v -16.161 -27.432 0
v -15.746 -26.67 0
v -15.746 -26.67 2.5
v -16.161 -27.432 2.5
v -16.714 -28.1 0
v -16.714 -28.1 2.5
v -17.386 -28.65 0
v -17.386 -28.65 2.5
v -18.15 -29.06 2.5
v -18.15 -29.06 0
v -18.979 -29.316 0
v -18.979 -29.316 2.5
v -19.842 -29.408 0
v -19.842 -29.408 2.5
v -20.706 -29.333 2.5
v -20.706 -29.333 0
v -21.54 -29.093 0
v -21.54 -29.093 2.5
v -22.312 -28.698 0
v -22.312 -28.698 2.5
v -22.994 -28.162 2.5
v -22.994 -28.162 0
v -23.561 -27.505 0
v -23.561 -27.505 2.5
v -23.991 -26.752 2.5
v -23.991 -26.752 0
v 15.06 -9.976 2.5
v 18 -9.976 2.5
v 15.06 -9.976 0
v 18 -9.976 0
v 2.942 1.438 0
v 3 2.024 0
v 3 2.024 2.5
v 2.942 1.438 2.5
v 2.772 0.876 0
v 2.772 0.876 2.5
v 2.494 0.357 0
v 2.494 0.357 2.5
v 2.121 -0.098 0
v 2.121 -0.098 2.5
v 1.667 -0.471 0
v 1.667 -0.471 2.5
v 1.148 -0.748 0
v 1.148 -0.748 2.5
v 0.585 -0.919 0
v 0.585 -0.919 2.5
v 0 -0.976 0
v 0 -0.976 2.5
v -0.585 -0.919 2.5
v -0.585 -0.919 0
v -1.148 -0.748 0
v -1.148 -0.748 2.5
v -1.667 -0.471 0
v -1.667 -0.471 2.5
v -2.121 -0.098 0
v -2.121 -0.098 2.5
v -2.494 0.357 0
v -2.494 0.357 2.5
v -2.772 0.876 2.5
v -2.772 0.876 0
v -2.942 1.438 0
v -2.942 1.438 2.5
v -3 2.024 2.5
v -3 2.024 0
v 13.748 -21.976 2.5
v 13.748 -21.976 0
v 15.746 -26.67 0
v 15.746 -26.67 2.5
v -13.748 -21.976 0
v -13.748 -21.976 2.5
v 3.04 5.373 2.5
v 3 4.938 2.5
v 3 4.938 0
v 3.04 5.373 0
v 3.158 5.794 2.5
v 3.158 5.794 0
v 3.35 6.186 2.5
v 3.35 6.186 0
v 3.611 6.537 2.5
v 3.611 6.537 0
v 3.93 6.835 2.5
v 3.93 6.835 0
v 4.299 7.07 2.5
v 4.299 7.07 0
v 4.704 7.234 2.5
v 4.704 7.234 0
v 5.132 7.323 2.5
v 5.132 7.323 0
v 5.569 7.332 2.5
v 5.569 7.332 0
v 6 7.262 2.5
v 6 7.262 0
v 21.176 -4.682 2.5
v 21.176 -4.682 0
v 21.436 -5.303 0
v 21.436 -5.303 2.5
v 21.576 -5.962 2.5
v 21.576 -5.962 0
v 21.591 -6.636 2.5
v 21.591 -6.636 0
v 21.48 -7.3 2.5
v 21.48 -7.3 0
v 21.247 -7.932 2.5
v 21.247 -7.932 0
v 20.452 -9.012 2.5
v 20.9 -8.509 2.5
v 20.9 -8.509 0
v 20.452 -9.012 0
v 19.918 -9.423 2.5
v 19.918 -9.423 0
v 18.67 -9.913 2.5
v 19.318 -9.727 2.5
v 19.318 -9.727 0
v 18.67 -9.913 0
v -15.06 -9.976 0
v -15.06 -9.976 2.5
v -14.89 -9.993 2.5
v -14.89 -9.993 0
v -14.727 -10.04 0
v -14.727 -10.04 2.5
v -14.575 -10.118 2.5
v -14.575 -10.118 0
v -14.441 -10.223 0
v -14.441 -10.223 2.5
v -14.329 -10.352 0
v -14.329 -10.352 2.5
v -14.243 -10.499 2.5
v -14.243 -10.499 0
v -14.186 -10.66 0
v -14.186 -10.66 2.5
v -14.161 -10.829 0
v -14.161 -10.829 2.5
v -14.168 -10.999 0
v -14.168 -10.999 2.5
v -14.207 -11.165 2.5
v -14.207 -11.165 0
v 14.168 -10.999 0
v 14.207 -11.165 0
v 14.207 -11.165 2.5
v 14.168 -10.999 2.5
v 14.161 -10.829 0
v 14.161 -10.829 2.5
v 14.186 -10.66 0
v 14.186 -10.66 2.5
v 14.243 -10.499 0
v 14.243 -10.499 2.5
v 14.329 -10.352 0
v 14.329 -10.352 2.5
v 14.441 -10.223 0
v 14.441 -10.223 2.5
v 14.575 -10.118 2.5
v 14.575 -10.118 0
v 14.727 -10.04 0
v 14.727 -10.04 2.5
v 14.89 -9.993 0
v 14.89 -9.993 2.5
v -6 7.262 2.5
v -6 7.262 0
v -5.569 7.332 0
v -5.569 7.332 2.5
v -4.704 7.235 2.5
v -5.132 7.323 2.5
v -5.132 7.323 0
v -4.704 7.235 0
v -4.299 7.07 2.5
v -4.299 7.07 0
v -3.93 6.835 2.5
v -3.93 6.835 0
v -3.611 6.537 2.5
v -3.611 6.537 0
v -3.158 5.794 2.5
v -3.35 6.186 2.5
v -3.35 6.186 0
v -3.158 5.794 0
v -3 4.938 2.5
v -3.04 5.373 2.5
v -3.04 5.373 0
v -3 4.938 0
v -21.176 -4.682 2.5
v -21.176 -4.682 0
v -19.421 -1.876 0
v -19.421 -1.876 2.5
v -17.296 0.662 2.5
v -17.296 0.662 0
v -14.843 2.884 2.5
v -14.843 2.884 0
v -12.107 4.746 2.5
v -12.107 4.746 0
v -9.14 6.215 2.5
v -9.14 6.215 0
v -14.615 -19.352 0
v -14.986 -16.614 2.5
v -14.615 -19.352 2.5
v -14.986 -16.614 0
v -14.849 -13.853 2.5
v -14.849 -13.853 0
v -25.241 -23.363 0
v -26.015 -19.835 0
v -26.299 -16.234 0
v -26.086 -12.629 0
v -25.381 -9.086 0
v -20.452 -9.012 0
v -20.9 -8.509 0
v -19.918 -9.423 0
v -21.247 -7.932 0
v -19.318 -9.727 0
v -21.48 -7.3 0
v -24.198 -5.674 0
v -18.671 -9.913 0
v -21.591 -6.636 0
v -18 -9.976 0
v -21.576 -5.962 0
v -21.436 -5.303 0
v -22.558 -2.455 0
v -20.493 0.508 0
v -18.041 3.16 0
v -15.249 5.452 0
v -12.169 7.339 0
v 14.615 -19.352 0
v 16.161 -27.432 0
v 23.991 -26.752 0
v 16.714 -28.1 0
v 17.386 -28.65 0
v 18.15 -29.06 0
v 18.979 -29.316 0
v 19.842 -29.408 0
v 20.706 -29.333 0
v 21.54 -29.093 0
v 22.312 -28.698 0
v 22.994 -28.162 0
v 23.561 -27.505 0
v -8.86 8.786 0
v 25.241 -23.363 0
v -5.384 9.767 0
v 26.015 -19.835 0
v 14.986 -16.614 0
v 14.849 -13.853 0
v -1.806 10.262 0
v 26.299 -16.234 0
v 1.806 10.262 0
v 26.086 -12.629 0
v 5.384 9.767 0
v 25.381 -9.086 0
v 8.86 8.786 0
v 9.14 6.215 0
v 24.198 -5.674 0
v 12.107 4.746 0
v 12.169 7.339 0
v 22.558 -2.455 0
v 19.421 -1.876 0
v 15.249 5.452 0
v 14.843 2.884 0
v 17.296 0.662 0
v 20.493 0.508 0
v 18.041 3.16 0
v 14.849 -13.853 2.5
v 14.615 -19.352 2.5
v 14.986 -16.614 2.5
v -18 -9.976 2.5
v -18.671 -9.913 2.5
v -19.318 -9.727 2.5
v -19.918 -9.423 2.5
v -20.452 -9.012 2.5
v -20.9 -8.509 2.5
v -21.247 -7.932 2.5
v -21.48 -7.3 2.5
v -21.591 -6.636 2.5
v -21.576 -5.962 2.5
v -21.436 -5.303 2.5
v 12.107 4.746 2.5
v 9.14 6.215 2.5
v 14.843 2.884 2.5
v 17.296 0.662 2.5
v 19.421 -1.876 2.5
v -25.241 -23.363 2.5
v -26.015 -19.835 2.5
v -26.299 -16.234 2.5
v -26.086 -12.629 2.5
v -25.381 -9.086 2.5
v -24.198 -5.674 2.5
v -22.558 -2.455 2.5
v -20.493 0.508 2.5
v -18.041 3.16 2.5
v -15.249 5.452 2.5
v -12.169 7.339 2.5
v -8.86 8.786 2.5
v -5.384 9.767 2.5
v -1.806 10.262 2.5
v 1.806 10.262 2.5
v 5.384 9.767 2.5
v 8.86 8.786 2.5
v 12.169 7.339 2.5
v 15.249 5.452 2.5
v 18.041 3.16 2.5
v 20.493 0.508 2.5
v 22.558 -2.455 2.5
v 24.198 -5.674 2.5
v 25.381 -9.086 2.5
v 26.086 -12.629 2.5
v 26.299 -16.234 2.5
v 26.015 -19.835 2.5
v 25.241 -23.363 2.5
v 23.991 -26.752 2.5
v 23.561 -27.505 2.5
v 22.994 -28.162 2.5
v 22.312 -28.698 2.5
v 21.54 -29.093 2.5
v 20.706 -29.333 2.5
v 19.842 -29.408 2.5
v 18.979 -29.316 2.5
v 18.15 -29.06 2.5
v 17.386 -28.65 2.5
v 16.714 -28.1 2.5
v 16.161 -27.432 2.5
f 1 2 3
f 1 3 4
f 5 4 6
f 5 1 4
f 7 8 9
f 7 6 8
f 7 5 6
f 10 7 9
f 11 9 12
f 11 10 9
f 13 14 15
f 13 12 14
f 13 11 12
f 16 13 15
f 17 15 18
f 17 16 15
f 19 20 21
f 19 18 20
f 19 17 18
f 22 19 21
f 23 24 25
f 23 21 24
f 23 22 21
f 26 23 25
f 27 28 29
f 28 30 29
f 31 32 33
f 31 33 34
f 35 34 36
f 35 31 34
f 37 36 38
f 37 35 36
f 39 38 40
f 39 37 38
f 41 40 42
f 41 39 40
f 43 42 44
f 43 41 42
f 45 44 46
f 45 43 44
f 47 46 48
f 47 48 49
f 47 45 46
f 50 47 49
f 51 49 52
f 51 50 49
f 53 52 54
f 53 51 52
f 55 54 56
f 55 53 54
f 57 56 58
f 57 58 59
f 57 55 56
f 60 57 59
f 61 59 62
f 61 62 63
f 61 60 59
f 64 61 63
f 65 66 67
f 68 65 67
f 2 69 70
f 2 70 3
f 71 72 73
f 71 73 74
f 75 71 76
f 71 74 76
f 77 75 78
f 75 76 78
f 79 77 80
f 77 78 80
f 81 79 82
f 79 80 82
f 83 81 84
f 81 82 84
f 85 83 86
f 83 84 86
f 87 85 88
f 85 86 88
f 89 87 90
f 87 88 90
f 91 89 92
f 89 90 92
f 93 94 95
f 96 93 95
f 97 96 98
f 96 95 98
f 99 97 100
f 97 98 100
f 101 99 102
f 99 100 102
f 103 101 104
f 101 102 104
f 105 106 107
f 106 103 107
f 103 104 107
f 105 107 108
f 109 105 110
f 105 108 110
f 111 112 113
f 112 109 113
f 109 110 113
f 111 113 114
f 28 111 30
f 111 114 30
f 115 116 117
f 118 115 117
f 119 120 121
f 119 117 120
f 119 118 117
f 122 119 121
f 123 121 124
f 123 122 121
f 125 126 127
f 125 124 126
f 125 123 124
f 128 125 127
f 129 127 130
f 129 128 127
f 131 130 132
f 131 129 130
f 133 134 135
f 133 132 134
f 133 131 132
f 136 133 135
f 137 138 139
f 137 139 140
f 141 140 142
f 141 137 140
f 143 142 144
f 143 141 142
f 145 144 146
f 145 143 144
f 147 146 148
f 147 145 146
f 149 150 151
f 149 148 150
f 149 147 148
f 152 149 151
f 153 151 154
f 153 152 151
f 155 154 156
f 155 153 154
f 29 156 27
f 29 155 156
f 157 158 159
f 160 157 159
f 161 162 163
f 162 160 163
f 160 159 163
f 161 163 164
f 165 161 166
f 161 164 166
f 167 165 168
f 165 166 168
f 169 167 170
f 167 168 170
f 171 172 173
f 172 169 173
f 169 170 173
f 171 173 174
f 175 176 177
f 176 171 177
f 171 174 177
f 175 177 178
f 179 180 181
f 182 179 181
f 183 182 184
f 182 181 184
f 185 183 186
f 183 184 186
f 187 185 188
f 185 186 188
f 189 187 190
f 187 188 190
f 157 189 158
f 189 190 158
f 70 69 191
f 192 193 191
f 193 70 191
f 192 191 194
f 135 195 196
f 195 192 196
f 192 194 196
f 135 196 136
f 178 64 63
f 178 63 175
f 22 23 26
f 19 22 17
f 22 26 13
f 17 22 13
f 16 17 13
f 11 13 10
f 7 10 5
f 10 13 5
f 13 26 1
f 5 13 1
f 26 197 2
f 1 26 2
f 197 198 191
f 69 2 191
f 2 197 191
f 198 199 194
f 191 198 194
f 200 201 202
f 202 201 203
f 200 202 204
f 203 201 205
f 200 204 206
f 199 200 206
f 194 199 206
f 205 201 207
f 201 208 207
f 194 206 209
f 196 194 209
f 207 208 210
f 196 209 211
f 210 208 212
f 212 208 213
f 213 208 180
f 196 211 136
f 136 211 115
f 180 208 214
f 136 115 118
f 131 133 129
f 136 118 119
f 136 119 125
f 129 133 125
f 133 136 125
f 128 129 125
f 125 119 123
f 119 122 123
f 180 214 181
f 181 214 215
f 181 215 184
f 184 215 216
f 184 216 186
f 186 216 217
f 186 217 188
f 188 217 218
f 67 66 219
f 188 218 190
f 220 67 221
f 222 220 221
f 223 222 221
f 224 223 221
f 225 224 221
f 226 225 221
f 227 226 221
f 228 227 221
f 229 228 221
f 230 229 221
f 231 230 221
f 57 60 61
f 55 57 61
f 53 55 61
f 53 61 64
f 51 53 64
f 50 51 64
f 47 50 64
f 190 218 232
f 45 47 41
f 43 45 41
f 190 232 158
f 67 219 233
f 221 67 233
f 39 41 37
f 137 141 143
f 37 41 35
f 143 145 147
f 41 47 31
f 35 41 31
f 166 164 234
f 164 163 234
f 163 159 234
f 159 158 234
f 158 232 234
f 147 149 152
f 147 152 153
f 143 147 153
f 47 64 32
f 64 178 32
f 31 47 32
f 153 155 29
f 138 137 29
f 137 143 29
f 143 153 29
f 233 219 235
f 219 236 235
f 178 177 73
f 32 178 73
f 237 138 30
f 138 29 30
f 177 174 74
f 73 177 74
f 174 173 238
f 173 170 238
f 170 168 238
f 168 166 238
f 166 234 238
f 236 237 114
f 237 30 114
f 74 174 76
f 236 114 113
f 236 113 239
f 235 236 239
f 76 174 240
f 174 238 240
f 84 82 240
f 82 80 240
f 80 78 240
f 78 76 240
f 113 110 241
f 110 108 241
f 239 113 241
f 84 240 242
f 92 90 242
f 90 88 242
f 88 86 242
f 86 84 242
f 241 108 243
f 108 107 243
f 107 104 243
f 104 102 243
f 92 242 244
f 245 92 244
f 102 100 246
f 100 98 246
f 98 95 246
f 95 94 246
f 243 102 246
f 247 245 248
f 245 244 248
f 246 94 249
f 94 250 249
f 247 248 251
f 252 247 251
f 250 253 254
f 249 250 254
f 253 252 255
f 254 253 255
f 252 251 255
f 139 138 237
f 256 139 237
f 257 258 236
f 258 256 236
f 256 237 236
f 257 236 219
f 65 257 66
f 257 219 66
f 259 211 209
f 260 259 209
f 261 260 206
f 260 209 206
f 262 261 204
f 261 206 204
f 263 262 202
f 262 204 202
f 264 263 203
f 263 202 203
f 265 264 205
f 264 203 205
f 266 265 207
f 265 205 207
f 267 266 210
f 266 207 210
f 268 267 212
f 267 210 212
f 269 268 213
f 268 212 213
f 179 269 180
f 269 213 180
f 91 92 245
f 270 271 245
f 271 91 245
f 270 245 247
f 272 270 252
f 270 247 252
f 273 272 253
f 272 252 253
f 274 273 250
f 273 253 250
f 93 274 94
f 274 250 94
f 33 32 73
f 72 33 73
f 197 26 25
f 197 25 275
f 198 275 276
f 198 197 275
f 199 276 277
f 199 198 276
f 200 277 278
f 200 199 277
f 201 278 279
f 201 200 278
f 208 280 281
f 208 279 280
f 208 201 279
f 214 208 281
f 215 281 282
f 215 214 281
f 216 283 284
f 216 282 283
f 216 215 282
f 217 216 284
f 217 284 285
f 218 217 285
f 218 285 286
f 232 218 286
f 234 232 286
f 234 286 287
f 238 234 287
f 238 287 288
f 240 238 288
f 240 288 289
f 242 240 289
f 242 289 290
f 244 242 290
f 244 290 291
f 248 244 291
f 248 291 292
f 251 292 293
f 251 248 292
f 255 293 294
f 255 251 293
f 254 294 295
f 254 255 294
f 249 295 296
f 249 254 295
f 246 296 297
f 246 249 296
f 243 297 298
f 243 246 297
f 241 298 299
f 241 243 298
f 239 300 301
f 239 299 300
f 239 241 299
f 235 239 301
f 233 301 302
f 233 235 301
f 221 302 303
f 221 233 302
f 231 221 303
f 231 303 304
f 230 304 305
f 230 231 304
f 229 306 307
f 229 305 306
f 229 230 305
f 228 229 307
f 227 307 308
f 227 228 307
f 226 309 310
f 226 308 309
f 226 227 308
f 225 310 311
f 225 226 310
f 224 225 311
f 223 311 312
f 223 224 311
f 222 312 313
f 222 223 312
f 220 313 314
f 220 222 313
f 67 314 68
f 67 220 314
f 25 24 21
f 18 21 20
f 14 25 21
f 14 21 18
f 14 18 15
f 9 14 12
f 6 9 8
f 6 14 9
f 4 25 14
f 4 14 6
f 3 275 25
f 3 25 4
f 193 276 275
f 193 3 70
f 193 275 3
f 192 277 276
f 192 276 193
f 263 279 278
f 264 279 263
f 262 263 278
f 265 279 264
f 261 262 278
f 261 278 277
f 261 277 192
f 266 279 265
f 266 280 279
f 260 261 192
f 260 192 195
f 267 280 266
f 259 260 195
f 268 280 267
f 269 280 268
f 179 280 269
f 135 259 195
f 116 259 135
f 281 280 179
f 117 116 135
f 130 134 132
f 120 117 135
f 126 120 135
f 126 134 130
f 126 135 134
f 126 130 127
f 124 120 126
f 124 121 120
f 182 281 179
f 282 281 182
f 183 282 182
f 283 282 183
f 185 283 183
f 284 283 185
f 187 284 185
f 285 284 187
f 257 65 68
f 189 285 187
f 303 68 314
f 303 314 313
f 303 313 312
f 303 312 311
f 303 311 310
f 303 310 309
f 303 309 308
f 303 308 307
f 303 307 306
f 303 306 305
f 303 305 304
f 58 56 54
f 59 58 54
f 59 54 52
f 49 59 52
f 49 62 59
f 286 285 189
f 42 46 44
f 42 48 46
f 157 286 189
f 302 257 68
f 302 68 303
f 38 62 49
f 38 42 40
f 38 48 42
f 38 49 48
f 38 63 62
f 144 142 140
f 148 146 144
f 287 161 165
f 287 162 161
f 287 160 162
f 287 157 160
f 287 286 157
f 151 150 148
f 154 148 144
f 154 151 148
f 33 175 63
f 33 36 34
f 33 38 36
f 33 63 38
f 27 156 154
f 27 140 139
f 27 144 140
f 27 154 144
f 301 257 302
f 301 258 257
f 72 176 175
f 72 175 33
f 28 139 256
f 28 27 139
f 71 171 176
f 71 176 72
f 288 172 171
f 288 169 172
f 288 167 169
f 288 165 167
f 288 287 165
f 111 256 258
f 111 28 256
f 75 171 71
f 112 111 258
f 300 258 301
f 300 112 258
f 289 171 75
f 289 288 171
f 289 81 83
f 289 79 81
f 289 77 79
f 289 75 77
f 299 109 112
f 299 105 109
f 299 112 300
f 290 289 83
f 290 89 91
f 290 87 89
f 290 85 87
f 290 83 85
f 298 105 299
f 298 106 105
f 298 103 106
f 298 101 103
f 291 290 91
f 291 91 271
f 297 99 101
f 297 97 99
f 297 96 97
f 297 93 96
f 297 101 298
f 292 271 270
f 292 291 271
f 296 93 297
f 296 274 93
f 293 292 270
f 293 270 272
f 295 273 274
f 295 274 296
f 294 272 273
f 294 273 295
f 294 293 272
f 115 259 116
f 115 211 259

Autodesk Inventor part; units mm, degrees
ref_plane "YZ Plane" through (0, 0, 0) normal (1, 0, 0) x (0, 1, 0)
ref_plane "XZ Plane" through (0, 0, 0) normal (0, 1, 0) x (-1, 0, 0)
sketch "Sketch1" plane through (0, 0, 0) normal (0, 0, 1) x (1, 0, 0)
  circle A0 centre (0, -15.9764) radius 16 construction
  line L0 (-3, 0.0236) -> (0, 0.0236) construction
  line L1 (-3.206, 0) -> (3.4858, 0) projected
  line L2 (-13.7477, -21.9764) -> (13.7477, -21.9764) construction
  arc A1 (-14.2074, -11.165) -> (-13.7477, -21.9764) centre (0, -15.9764) ccw
  line L3 (0, 1.949) -> (0, -3.4788) projected
  arc A2 (-3, 2.0236) -> (3, 2.0236) centre (0, 2.0236) ccw
  arc A3 (23.9912, -26.7519) -> (-23.9912, -26.7519) centre (0, -15.9764) ccw
  line L4 (-18, -9.9764) -> (-15.0599, -9.9764)
  line L5 (-3, 2.0236) -> (-3, 4.9378)
  arc A4 (-6, 7.2615) -> (-21.1765, -4.6822) centre (0, -15.9764) ccw
  arc A5 (-3, 4.9378) -> (-6, 7.2615) centre (-5.4, 4.9378) ccw
  arc A6 (-21.1765, -4.6822) -> (-18, -9.9764) centre (-18, -6.3764) ccw
  arc A7 (-14.2074, -11.165) -> (-15.0599, -9.9764) centre (-15.0599, -10.8764) ccw
  line L6 (0, 10.3236) -> (2.5298, 10.3236) construction
  line L7 (-13.7477, -21.9764) -> (-15.7457, -26.6705)
  arc A8 (-23.9912, -26.7519) -> (-15.7457, -26.6705) centre (-19.8862, -24.9082) ccw
  line L8 (0, -0.9764) -> (-1.2778, -0.9764) construction
  line L9 (13.7477, -21.9764) -> (15.7457, -26.6705)
  arc A9 (15.7457, -26.6705) -> (23.9912, -26.7519) centre (19.8862, -24.9082) ccw
  arc A10 (13.7477, -21.9764) -> (14.2074, -11.165) centre (0, -15.9764) ccw
  line L10 (18, -9.9764) -> (15.0599, -9.9764)
  line L11 (3, 2.0236) -> (3, 4.9378)
  arc A11 (21.1765, -4.6822) -> (6, 7.2615) centre (0, -15.9764) ccw
  arc A12 (6, 7.2615) -> (3, 4.9378) centre (5.4, 4.9378) ccw
  arc A13 (18, -9.9764) -> (21.1765, -4.6822) centre (18, -6.3764) ccw
  arc A14 (15.0599, -9.9764) -> (14.2074, -11.165) centre (15.0599, -10.8764) ccw
  point P0 (3, 0.0236)
  dimension "d0" = 32
  dimension "d3" = 6
  dimension "d4" = 3
  dimension "d5" = 52.6
  dimension "d8" = 24
  dimension "d9" = 6
  dimension "d10" = 2.4
  dimension "d11" = 3.6
  dimension "d12" = 0.9
  dimension "d13" = 4.5
  dimension "d14" = 15
  dimension "d15" = 15
extrude "Body" add sketch "Sketch1" along normal blind 2.5
ref_plane "Work Plane1" through (0, -15.9764, 0) normal (-1, 0, 0) x (0, 0, 1)
equation "\"d0\" = WD"
equation "\"d3\" = 0.2 * ND"
equation "\"d4\" = 0.1 * ND"
equation "\"d5\" = SD2"
equation "\"d8\" = 0.8 * ND"
equation "\"d9\" = 0.2 * ND"
equation "\"d10\" = 0.08 * ND"
equation "\"d11\" = 0.12 * ND"
equation "\"d12\" = 0.03 * ND"
equation "\"d13\" = 0.15 * ND"
equation "\"d14\" = 0.5 * ND"
equation "\"d15\" = 0.5 * ND"
equation "\"d16\" = SD"
equation "\"SD\" = 2.5"
equation "\"WD\" = 32"
equation "\"d1\" = 1.6 * ND"
equation "\"SD2\" = 52.6"
equation "\"d7\" = 0.15 * ND"
equation "\"WDMIN\" = 25"
equation "\"SNB\" = 2.55"
equation "\"WDMAX\" = 38"
equation "\"BUBRMI\" = 4"
equation "\"ND\" = 30"
properties part number "DIN 6799 - 30" material "Steel, Mild"
